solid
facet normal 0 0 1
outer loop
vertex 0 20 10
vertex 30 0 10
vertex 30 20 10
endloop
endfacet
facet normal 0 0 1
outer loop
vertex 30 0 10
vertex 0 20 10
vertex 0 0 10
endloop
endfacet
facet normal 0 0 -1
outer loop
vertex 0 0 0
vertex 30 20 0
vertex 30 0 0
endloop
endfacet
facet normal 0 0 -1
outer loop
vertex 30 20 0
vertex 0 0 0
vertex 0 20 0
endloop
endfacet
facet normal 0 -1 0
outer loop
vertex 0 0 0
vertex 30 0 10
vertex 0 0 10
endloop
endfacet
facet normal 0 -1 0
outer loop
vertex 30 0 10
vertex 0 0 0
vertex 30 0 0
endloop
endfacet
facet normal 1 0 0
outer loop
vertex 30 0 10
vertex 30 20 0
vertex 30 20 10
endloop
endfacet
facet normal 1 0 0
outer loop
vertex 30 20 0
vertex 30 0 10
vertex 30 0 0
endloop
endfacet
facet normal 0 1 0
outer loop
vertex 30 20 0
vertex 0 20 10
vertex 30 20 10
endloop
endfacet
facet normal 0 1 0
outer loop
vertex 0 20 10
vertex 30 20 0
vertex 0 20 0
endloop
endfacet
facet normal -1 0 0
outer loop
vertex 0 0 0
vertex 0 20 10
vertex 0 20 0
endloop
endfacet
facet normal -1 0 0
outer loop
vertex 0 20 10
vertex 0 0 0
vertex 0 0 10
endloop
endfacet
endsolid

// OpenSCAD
// Reproduction of the failure mode check_dimensions.py exists to catch:
// geometry that renders, compiles, and *looks* right but is the wrong size.
// Here the outer width comes from a hardcoded literal instead of the declared
// width parameter -- a units slip / parameter that didn't thread through.

$fa = 2; $fs = 0.3;

// EXPECTED_BBOX: [40, 20, 10]

declared_width = 40;   // the design intent, declared above

// the bug: the literal 30 is used instead of declared_width
cube([30, 20, 10]);
